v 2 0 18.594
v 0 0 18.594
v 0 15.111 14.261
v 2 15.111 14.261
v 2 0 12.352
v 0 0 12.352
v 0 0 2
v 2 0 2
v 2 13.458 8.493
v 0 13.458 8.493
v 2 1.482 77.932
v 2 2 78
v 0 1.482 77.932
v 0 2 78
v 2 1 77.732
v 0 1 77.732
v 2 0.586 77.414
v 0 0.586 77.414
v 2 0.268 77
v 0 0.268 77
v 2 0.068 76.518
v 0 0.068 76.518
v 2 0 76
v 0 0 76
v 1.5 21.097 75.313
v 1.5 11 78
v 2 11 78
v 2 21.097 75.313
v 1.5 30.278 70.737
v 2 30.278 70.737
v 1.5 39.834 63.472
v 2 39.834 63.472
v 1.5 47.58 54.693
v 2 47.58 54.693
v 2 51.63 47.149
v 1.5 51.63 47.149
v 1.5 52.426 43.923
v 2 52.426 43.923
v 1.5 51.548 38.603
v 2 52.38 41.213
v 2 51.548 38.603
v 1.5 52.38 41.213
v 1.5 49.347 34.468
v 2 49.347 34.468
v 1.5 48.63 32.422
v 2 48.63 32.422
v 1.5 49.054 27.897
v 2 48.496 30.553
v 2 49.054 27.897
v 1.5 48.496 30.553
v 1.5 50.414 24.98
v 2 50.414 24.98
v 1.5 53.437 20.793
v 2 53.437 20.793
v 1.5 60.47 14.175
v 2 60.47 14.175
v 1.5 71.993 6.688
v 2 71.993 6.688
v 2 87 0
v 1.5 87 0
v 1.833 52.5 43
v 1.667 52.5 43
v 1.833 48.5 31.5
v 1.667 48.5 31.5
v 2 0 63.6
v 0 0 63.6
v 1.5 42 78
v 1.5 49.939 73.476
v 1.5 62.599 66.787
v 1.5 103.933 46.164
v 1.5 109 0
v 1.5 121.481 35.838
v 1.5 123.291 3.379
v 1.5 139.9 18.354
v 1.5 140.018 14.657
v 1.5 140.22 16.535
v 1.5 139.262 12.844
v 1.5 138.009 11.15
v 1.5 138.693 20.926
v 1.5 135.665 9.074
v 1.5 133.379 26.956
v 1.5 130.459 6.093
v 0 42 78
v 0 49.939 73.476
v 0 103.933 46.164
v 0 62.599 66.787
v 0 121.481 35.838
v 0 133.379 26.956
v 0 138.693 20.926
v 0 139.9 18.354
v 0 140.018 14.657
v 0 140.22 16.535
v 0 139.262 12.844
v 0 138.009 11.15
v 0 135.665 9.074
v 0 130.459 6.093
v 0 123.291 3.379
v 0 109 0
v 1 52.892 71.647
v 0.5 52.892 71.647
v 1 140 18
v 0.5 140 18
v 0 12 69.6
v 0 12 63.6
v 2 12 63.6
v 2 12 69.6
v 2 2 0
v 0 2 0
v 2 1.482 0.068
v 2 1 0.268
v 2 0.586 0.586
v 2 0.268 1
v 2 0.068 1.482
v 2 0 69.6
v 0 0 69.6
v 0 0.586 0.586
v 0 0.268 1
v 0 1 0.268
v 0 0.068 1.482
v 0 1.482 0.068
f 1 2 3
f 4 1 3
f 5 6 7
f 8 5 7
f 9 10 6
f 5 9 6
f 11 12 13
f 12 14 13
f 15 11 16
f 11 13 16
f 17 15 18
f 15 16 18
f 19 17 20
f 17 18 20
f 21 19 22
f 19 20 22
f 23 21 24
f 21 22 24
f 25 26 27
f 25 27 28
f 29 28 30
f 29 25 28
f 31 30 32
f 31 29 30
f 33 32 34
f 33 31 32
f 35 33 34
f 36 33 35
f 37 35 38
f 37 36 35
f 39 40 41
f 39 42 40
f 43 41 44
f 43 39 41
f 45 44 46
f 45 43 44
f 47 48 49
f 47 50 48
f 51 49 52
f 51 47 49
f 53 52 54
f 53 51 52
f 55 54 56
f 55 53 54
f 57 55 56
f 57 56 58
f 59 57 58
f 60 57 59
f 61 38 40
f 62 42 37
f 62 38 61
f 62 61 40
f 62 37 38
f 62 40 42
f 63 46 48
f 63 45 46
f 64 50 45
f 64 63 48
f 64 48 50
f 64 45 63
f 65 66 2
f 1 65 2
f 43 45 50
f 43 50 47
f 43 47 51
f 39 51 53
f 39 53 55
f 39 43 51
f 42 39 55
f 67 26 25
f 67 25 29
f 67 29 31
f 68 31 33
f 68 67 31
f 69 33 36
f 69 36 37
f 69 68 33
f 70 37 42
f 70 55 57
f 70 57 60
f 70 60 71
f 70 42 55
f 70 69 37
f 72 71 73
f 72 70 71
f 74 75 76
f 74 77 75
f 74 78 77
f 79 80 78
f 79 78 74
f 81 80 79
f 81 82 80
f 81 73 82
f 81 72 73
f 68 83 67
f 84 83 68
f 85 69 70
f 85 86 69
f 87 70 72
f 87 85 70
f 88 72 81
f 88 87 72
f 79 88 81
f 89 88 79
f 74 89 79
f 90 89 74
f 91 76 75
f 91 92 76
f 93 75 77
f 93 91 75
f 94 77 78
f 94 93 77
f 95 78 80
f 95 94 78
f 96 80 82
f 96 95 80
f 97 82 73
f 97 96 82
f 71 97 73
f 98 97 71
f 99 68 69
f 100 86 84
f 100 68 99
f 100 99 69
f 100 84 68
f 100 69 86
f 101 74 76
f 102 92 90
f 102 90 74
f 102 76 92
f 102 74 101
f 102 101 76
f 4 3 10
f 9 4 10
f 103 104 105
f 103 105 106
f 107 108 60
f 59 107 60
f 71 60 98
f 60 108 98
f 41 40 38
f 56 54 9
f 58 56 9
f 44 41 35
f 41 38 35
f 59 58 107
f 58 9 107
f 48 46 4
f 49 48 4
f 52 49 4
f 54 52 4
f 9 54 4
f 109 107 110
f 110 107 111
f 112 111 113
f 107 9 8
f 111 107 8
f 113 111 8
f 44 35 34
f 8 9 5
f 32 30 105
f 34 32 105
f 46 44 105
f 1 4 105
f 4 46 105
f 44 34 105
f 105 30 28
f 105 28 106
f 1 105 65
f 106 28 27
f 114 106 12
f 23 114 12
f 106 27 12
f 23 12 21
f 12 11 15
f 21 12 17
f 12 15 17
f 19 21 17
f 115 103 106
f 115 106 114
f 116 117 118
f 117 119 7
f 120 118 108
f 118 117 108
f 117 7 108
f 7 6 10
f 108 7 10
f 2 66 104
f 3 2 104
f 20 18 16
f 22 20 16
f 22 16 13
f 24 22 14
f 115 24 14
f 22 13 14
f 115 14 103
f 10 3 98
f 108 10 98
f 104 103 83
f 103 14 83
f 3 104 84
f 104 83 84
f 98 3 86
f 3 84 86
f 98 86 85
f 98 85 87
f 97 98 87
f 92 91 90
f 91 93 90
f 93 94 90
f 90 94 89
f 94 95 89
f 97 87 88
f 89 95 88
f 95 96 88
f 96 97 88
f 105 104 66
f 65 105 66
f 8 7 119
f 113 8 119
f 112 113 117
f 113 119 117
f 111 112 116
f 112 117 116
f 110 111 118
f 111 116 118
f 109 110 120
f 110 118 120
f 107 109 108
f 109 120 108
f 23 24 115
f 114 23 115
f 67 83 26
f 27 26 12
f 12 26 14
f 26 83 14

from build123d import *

# Parameters (mm, degrees)
F1_DEPTH = 1.5
F4_DEPTH = 0.5
F5_W     = 12
F5_H     = 6
F6_DEPTH = 25


with BuildPart() as f1:
    # F0 (on Right) → F1 (new body)
    with BuildSketch(Plane.YZ):
        with BuildLine():
            Line((42, 78), (2, 78))
            ThreePointArc((2, 78), (0.5857864376, 77.4142135624), (0, 76))
            Line((0, 76), (0, 69.6))
            Line((0, 69.6), (12, 69.6))
            Line((12, 69.6), (12, 63.6))
            Line((12, 63.6), (0, 63.6))
            Line((0, 63.6), (0, 18.5937966152))
            Line((0, 18.5937966152), (15.111487878, 14.2606471942))
            Line((15.111487878, 14.2606471942), (13.4576637431, 8.4930770186))
            Line((13.4576637431, 8.4930770186), (0, 12.352))
            Line((0, 12.352), (0, 2))
            ThreePointArc((0, 2), (0.5857864376, 0.5857864376), (2, 0))
            Line((2, 0), (109, 0))
            add(Edge.make_bspline(
                [(42, 78), (49.7588251107, 74.4711096647), (42.8270565854, 74.0872679271), (176.3258193003, 17.6443266752), (122.5913906271, 2.3415980892), (109, 0)],
                knots=[0, 0, 0, 0, 0.1806872551, 0.6953480319, 1, 1, 1, 1], degree=3))
        make_face()
    extrude(amount=F1_DEPTH)

    # F3 (on face) → F4 (join)
    with BuildSketch(Plane.YZ.offset(1.5)):
        with BuildLine():
            add(Edge.make_bspline(
                [(11, 78), (33.8045589941, 74.6475609926), (60.8453739258, 43.3923563223), (40.9565199131, 30.4234463117), (61.9851178247, 9.0627176212), (87, 0)],
                knots=[0, 0, 0, 0, 0.4113848141, 0.6062089181, 1, 1, 1, 1], degree=3))
            Line((11, 78), (2, 78))
            ThreePointArc((2, 78), (0.5857864376, 77.4142135624), (0, 76))
            Line((0, 76), (0, 2))
            ThreePointArc((0, 2), (0.5857864376, 0.5857864376), (2, 0))
            Line((2, 0), (87, 0))
        make_face()
    extrude(amount=F4_DEPTH)

    # F5 (on face) → F6 (cut)
    with BuildSketch(Plane(origin=(0, 0, 0), x_dir=(0, -1, 0), z_dir=(-1, 0, 0))):
        with Locations((-6, 66.6)):
            Rectangle(F5_W, F5_H)
        Polygon((0, 12.352), (0, 18.5937966152), (-15.111487878, 14.2606471942), (-13.4576637431, 8.4930770186), align=None)
    extrude(amount=-F6_DEPTH, mode=Mode.SUBTRACT)


solid = f1.part
